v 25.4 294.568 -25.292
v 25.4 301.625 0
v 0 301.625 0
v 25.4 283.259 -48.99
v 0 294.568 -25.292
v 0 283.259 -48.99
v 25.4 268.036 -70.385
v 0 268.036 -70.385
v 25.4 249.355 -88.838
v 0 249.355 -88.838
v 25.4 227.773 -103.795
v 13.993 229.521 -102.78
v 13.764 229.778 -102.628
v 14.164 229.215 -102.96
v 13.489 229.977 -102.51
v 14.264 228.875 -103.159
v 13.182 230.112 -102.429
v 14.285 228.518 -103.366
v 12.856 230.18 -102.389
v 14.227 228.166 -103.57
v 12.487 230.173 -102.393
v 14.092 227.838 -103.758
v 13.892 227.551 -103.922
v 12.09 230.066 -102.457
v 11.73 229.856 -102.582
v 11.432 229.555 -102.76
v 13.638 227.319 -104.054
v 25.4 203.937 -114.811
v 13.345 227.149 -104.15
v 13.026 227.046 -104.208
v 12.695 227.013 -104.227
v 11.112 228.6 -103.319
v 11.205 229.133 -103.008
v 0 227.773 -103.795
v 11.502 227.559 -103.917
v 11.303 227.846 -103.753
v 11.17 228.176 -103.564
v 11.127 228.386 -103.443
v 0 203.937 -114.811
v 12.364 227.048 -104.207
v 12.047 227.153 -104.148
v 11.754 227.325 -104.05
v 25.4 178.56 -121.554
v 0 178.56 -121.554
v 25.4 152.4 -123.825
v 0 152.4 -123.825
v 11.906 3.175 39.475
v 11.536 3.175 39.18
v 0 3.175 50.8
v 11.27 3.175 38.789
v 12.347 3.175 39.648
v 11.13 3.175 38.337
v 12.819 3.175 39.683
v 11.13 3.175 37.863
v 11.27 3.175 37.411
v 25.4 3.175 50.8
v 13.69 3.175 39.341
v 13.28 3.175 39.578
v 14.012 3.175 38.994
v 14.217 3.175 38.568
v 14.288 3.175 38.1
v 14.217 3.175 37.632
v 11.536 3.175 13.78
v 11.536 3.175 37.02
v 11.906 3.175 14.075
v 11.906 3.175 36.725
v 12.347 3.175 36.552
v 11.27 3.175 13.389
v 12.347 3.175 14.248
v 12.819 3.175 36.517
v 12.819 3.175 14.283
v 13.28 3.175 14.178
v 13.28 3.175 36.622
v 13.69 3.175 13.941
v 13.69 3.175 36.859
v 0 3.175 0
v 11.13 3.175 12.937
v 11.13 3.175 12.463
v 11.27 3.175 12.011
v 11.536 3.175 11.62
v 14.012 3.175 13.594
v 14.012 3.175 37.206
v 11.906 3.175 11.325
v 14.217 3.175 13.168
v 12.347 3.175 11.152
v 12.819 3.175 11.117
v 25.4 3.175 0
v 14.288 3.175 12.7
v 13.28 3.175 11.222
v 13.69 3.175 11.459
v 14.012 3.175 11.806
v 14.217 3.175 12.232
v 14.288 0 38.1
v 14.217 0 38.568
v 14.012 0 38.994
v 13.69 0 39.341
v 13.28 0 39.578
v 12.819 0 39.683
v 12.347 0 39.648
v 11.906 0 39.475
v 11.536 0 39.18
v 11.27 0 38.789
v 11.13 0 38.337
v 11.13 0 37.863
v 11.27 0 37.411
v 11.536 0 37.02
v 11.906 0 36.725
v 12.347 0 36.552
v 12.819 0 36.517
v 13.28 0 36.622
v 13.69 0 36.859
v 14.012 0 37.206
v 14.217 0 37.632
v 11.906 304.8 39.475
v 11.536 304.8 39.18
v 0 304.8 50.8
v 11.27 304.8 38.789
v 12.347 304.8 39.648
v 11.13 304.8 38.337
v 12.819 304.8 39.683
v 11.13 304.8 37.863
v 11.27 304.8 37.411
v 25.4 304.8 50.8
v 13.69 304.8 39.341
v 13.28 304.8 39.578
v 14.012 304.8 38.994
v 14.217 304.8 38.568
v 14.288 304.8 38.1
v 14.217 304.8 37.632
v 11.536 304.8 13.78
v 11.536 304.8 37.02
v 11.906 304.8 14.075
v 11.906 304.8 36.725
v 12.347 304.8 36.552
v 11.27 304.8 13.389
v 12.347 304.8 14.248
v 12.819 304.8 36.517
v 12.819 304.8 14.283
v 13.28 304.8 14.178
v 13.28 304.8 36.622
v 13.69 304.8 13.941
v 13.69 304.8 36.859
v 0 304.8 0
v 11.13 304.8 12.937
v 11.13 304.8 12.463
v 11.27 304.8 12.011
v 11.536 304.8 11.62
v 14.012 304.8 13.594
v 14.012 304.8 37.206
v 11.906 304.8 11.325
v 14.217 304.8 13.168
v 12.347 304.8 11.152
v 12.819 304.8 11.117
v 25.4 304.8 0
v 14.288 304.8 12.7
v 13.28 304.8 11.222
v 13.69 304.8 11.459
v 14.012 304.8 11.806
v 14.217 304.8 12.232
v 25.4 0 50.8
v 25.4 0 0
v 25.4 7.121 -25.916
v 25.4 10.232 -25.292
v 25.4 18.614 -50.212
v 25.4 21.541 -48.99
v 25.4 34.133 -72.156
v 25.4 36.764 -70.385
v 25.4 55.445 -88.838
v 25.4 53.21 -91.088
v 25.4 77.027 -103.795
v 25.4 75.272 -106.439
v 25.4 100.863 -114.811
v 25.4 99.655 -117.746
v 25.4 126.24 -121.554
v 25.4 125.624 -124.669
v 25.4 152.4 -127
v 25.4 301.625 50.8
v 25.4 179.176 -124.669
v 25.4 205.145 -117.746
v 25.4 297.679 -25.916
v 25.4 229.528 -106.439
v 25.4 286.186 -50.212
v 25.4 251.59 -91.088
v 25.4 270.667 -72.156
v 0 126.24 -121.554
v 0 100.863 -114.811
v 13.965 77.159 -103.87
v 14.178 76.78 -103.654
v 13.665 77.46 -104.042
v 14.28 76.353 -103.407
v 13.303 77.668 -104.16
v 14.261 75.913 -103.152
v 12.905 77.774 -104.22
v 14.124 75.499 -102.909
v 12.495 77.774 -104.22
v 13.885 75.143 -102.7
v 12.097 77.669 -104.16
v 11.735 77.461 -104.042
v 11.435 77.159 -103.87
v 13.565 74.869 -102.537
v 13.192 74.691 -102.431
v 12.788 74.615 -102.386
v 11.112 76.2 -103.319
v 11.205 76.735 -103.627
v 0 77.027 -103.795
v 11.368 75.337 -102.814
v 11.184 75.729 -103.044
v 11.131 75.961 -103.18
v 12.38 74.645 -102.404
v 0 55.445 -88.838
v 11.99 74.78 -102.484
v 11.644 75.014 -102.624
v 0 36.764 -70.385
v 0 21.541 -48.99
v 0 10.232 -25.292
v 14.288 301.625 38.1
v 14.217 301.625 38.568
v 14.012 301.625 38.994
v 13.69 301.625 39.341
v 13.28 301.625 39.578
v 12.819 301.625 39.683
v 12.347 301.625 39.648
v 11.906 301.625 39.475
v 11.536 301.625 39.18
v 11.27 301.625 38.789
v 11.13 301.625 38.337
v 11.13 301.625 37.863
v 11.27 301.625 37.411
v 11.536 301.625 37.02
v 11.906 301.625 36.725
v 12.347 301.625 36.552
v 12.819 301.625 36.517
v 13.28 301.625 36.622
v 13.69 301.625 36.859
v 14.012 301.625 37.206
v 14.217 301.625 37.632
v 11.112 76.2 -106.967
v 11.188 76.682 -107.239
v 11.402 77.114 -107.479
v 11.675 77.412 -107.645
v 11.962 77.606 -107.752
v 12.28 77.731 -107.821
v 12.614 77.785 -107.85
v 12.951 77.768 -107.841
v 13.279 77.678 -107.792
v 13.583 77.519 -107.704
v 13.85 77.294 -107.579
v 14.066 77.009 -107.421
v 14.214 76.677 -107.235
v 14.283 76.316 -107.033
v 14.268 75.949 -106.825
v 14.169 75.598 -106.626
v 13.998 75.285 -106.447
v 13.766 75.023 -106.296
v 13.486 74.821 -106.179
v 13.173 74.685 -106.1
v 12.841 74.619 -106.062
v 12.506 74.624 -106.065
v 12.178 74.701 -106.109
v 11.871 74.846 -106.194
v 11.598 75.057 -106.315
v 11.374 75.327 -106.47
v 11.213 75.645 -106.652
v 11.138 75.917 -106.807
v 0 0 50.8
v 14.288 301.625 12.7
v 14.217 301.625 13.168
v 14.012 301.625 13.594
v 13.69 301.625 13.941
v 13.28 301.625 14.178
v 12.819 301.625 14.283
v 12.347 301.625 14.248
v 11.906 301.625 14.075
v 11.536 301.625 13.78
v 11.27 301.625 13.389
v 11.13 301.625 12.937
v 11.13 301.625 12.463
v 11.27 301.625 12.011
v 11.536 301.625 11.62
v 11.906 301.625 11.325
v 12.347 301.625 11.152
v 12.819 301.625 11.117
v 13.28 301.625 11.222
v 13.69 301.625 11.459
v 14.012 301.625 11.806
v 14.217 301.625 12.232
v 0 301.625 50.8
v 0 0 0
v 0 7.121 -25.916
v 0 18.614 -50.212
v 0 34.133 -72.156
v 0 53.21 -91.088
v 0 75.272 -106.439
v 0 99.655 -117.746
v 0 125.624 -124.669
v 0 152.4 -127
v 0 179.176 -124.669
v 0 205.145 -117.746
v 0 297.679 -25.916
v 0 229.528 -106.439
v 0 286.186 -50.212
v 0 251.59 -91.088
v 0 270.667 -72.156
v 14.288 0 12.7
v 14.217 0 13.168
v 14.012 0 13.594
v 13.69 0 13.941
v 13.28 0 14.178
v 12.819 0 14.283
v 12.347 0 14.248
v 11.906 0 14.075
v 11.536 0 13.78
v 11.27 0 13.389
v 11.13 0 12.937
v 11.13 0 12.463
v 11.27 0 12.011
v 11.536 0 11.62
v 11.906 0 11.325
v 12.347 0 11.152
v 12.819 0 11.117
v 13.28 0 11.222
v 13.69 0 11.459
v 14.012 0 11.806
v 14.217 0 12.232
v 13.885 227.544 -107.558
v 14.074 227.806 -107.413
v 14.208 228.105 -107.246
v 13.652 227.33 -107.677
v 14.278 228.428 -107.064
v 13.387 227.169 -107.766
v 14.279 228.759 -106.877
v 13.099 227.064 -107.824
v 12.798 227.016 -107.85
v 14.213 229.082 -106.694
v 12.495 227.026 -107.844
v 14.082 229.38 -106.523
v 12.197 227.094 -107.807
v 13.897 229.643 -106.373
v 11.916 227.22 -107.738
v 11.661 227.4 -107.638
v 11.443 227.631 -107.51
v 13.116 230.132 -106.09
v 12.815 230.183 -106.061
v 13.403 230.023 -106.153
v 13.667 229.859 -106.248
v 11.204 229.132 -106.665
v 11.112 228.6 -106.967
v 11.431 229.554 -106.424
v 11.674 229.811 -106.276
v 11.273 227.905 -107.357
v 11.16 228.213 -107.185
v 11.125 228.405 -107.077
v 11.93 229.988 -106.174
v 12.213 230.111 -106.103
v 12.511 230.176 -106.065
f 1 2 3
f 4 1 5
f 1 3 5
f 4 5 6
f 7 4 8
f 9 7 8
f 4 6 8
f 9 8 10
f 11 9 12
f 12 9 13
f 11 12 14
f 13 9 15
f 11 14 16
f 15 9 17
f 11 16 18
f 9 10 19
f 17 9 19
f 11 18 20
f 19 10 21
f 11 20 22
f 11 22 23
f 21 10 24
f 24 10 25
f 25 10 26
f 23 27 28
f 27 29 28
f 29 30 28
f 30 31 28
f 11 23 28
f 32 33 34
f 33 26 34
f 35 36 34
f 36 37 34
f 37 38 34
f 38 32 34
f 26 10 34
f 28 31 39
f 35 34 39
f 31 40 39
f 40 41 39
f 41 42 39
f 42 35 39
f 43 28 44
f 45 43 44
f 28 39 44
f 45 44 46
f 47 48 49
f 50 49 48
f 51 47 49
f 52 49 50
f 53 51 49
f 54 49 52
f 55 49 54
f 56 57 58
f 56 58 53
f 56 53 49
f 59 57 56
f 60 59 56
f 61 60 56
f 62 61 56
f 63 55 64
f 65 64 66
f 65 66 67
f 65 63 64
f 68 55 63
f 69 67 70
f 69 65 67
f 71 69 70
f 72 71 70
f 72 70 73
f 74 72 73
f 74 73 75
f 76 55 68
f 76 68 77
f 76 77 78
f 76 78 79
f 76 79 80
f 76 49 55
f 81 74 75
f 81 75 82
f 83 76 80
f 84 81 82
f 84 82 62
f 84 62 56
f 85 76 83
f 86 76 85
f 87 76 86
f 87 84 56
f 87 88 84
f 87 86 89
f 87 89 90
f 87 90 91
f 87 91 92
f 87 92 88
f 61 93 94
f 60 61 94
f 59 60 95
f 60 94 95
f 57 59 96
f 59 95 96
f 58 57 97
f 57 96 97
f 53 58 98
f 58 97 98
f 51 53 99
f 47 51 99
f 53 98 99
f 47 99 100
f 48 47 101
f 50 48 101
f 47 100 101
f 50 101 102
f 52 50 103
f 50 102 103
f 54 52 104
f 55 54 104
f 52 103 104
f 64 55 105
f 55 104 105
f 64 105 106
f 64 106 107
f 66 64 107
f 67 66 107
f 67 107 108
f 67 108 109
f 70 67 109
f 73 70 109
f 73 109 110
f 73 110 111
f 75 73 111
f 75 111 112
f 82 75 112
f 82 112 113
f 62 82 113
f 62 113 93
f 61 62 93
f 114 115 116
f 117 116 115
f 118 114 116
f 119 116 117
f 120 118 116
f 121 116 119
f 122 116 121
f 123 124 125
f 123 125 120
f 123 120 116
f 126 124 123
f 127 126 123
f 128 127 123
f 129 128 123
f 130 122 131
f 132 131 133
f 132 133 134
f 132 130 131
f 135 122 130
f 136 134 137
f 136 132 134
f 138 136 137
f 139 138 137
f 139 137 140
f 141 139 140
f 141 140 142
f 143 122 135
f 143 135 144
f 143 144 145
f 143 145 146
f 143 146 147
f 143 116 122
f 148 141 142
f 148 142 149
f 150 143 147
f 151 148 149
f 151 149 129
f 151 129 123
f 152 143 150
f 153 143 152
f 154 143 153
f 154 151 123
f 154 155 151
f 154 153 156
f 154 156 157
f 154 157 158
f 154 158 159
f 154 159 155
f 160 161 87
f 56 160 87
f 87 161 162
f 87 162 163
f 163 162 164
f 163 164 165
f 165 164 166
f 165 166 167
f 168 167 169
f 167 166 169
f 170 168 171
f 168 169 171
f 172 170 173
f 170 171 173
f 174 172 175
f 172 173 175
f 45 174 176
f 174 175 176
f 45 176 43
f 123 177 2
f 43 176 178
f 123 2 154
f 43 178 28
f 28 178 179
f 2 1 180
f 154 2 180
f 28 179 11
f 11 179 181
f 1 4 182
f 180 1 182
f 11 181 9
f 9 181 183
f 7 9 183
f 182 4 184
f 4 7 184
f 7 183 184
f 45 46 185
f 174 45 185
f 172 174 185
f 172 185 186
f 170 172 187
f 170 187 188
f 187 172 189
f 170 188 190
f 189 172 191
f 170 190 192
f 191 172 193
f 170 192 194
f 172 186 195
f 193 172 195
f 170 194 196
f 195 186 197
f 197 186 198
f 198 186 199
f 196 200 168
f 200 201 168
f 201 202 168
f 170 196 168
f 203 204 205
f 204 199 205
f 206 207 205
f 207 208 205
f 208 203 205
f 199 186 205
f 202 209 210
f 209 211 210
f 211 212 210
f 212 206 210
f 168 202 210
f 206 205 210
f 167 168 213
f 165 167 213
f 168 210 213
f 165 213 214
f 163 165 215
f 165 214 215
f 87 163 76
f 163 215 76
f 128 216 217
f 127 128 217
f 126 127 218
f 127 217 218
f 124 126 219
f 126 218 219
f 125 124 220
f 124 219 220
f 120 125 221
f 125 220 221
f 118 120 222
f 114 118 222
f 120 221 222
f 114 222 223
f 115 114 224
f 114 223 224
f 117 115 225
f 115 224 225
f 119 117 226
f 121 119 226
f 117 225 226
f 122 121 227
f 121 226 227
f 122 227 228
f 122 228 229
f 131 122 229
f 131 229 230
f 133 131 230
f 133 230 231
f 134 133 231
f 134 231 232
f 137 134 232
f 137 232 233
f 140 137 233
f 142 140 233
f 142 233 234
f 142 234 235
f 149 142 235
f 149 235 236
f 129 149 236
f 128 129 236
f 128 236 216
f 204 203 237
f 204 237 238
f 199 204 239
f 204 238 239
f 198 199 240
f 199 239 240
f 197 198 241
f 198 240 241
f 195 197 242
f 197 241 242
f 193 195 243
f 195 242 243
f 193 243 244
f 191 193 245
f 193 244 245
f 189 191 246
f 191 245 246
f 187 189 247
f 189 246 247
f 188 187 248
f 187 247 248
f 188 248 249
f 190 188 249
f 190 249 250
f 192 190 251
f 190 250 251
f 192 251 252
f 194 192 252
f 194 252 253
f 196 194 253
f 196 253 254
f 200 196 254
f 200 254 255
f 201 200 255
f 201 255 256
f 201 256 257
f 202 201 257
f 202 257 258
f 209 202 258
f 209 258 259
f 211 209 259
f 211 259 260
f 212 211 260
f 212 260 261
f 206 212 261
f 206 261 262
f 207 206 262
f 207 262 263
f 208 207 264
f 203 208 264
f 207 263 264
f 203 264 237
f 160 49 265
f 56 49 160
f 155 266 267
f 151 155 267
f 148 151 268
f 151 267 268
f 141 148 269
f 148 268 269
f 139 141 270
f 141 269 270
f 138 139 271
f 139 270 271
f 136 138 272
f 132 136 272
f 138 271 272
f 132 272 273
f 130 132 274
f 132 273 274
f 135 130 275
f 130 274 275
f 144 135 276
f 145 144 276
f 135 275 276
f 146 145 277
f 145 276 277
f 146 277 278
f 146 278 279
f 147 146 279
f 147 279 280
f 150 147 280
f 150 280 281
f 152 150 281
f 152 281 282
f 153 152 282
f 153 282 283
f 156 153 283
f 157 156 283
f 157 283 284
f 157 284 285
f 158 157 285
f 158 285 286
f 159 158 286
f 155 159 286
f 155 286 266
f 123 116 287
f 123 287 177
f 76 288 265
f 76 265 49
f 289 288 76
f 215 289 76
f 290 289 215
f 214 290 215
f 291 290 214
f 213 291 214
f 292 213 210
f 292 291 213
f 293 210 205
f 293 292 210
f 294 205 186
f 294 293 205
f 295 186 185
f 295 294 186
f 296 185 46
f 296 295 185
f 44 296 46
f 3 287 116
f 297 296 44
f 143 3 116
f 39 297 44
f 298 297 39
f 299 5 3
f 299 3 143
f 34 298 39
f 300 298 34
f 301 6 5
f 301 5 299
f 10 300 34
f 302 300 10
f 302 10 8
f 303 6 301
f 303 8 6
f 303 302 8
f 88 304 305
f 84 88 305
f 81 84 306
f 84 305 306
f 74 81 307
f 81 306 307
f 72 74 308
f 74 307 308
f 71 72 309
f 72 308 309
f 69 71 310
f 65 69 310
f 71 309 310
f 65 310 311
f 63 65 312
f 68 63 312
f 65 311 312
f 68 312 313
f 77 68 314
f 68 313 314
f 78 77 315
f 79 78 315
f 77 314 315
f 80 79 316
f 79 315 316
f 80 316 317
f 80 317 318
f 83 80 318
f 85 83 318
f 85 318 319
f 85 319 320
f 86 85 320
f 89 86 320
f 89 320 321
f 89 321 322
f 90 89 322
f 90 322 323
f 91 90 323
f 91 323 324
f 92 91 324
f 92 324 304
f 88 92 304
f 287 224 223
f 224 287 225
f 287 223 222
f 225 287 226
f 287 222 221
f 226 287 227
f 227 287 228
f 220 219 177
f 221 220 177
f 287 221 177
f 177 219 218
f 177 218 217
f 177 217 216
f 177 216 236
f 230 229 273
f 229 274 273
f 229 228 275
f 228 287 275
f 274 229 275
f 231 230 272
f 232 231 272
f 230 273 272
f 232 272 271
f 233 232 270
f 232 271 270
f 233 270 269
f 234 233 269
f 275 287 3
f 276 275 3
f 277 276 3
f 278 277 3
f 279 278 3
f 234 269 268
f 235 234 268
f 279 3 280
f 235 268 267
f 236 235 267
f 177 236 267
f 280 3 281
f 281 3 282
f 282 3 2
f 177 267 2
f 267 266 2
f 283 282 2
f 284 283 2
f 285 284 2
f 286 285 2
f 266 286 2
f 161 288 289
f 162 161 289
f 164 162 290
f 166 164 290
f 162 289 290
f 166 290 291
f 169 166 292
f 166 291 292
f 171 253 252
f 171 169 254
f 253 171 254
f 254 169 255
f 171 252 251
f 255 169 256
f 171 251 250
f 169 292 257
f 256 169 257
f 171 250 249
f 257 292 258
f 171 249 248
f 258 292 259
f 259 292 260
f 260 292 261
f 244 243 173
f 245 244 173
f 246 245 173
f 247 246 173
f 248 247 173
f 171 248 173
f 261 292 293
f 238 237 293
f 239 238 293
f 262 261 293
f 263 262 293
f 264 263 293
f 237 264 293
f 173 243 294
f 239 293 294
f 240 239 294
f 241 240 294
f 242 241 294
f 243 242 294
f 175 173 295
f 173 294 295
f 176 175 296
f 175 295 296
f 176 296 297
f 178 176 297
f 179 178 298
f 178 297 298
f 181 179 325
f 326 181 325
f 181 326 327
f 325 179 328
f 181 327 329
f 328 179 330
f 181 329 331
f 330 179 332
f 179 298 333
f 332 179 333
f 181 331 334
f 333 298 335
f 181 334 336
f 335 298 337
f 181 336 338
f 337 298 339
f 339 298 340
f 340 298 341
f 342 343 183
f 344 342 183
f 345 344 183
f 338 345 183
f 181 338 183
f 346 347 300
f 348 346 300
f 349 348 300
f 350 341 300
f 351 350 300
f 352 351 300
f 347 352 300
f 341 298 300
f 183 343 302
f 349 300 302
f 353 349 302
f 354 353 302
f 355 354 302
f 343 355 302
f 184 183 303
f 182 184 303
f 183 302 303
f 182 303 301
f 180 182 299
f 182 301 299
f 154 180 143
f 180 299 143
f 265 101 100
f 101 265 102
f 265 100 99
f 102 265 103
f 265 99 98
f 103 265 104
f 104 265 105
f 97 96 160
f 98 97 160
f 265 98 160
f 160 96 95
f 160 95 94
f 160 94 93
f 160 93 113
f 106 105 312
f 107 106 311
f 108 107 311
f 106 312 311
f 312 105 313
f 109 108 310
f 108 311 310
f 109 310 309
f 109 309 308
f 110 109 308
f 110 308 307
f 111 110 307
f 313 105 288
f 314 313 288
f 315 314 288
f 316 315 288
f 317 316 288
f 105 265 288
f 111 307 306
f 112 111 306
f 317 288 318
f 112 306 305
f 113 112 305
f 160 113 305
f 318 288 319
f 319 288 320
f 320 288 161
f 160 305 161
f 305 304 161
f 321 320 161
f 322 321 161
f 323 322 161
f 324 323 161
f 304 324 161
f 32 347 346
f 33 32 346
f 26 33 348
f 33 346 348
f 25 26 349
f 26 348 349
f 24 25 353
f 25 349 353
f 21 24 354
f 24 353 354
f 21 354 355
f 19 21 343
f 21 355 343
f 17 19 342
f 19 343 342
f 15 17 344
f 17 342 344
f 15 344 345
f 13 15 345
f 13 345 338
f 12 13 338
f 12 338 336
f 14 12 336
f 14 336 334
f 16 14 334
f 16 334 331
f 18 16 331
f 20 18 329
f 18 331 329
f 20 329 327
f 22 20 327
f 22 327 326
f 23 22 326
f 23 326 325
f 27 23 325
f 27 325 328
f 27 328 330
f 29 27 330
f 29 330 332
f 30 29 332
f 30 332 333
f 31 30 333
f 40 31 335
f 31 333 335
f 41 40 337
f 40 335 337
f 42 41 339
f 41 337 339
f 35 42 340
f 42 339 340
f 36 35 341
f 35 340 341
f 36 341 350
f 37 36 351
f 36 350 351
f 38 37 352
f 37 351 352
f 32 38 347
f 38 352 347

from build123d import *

# Parameters (mm, degrees)
F1_DEPTH  = 25.4
F1_FACE_W = 25.4
F1_FACE_H = 3.175
F2_DEPTH  = 50.8
F4_D      = 3.175
F6_D      = 3.175


with BuildPart() as f1:
    # F0 (on Right) → F1 (new body)
    with BuildSketch(Plane.YZ):
        with BuildLine():
            Line((3.175, 0), (0, 0))
            ThreePointArc((0, 0), (53.209829, -91.088205), (152.4, -127))
            Line((152.4, -127), (152.4, -123.825))
            ThreePointArc((152.4, -123.825), (55.44546, -88.837522), (3.175, 0))
        make_face()
        with BuildLine():
            Line((152.4, -123.825), (152.4, -127))
            ThreePointArc((152.4, -127), (251.590171, -91.088205), (304.8, 0))
            Line((304.8, 0), (301.625, 0))
            ThreePointArc((301.625, 0), (249.35454, -88.837522), (152.4, -123.825))
        make_face()
    extrude(amount=F1_DEPTH)

    # F1_face (on face) → F2 (join)
    with BuildSketch(Plane(origin=(12.7, 1.5875, 0), x_dir=(1, 0, 0), z_dir=(0, 0, 1))):
        Rectangle(F1_FACE_W, F1_FACE_H)
        with Locations((0, 301.625)):
            Rectangle(F1_FACE_W, F1_FACE_H)
    extrude(amount=F2_DEPTH)

    # F4 (through all)
    with Locations(Plane(origin=(0, 304.8, 0), x_dir=(-1, 0, 0), z_dir=(0, 1, 0))):
        with Locations((-12.7, 38.1), (-12.7, 12.7)):
            Hole(F4_D / 2)

    # F6 (through all)
    with Locations(Plane.XY):
        with Locations((12.7, 76.2), (12.7, 228.6)):
            Hole(F6_D / 2)


solid = f1.part
